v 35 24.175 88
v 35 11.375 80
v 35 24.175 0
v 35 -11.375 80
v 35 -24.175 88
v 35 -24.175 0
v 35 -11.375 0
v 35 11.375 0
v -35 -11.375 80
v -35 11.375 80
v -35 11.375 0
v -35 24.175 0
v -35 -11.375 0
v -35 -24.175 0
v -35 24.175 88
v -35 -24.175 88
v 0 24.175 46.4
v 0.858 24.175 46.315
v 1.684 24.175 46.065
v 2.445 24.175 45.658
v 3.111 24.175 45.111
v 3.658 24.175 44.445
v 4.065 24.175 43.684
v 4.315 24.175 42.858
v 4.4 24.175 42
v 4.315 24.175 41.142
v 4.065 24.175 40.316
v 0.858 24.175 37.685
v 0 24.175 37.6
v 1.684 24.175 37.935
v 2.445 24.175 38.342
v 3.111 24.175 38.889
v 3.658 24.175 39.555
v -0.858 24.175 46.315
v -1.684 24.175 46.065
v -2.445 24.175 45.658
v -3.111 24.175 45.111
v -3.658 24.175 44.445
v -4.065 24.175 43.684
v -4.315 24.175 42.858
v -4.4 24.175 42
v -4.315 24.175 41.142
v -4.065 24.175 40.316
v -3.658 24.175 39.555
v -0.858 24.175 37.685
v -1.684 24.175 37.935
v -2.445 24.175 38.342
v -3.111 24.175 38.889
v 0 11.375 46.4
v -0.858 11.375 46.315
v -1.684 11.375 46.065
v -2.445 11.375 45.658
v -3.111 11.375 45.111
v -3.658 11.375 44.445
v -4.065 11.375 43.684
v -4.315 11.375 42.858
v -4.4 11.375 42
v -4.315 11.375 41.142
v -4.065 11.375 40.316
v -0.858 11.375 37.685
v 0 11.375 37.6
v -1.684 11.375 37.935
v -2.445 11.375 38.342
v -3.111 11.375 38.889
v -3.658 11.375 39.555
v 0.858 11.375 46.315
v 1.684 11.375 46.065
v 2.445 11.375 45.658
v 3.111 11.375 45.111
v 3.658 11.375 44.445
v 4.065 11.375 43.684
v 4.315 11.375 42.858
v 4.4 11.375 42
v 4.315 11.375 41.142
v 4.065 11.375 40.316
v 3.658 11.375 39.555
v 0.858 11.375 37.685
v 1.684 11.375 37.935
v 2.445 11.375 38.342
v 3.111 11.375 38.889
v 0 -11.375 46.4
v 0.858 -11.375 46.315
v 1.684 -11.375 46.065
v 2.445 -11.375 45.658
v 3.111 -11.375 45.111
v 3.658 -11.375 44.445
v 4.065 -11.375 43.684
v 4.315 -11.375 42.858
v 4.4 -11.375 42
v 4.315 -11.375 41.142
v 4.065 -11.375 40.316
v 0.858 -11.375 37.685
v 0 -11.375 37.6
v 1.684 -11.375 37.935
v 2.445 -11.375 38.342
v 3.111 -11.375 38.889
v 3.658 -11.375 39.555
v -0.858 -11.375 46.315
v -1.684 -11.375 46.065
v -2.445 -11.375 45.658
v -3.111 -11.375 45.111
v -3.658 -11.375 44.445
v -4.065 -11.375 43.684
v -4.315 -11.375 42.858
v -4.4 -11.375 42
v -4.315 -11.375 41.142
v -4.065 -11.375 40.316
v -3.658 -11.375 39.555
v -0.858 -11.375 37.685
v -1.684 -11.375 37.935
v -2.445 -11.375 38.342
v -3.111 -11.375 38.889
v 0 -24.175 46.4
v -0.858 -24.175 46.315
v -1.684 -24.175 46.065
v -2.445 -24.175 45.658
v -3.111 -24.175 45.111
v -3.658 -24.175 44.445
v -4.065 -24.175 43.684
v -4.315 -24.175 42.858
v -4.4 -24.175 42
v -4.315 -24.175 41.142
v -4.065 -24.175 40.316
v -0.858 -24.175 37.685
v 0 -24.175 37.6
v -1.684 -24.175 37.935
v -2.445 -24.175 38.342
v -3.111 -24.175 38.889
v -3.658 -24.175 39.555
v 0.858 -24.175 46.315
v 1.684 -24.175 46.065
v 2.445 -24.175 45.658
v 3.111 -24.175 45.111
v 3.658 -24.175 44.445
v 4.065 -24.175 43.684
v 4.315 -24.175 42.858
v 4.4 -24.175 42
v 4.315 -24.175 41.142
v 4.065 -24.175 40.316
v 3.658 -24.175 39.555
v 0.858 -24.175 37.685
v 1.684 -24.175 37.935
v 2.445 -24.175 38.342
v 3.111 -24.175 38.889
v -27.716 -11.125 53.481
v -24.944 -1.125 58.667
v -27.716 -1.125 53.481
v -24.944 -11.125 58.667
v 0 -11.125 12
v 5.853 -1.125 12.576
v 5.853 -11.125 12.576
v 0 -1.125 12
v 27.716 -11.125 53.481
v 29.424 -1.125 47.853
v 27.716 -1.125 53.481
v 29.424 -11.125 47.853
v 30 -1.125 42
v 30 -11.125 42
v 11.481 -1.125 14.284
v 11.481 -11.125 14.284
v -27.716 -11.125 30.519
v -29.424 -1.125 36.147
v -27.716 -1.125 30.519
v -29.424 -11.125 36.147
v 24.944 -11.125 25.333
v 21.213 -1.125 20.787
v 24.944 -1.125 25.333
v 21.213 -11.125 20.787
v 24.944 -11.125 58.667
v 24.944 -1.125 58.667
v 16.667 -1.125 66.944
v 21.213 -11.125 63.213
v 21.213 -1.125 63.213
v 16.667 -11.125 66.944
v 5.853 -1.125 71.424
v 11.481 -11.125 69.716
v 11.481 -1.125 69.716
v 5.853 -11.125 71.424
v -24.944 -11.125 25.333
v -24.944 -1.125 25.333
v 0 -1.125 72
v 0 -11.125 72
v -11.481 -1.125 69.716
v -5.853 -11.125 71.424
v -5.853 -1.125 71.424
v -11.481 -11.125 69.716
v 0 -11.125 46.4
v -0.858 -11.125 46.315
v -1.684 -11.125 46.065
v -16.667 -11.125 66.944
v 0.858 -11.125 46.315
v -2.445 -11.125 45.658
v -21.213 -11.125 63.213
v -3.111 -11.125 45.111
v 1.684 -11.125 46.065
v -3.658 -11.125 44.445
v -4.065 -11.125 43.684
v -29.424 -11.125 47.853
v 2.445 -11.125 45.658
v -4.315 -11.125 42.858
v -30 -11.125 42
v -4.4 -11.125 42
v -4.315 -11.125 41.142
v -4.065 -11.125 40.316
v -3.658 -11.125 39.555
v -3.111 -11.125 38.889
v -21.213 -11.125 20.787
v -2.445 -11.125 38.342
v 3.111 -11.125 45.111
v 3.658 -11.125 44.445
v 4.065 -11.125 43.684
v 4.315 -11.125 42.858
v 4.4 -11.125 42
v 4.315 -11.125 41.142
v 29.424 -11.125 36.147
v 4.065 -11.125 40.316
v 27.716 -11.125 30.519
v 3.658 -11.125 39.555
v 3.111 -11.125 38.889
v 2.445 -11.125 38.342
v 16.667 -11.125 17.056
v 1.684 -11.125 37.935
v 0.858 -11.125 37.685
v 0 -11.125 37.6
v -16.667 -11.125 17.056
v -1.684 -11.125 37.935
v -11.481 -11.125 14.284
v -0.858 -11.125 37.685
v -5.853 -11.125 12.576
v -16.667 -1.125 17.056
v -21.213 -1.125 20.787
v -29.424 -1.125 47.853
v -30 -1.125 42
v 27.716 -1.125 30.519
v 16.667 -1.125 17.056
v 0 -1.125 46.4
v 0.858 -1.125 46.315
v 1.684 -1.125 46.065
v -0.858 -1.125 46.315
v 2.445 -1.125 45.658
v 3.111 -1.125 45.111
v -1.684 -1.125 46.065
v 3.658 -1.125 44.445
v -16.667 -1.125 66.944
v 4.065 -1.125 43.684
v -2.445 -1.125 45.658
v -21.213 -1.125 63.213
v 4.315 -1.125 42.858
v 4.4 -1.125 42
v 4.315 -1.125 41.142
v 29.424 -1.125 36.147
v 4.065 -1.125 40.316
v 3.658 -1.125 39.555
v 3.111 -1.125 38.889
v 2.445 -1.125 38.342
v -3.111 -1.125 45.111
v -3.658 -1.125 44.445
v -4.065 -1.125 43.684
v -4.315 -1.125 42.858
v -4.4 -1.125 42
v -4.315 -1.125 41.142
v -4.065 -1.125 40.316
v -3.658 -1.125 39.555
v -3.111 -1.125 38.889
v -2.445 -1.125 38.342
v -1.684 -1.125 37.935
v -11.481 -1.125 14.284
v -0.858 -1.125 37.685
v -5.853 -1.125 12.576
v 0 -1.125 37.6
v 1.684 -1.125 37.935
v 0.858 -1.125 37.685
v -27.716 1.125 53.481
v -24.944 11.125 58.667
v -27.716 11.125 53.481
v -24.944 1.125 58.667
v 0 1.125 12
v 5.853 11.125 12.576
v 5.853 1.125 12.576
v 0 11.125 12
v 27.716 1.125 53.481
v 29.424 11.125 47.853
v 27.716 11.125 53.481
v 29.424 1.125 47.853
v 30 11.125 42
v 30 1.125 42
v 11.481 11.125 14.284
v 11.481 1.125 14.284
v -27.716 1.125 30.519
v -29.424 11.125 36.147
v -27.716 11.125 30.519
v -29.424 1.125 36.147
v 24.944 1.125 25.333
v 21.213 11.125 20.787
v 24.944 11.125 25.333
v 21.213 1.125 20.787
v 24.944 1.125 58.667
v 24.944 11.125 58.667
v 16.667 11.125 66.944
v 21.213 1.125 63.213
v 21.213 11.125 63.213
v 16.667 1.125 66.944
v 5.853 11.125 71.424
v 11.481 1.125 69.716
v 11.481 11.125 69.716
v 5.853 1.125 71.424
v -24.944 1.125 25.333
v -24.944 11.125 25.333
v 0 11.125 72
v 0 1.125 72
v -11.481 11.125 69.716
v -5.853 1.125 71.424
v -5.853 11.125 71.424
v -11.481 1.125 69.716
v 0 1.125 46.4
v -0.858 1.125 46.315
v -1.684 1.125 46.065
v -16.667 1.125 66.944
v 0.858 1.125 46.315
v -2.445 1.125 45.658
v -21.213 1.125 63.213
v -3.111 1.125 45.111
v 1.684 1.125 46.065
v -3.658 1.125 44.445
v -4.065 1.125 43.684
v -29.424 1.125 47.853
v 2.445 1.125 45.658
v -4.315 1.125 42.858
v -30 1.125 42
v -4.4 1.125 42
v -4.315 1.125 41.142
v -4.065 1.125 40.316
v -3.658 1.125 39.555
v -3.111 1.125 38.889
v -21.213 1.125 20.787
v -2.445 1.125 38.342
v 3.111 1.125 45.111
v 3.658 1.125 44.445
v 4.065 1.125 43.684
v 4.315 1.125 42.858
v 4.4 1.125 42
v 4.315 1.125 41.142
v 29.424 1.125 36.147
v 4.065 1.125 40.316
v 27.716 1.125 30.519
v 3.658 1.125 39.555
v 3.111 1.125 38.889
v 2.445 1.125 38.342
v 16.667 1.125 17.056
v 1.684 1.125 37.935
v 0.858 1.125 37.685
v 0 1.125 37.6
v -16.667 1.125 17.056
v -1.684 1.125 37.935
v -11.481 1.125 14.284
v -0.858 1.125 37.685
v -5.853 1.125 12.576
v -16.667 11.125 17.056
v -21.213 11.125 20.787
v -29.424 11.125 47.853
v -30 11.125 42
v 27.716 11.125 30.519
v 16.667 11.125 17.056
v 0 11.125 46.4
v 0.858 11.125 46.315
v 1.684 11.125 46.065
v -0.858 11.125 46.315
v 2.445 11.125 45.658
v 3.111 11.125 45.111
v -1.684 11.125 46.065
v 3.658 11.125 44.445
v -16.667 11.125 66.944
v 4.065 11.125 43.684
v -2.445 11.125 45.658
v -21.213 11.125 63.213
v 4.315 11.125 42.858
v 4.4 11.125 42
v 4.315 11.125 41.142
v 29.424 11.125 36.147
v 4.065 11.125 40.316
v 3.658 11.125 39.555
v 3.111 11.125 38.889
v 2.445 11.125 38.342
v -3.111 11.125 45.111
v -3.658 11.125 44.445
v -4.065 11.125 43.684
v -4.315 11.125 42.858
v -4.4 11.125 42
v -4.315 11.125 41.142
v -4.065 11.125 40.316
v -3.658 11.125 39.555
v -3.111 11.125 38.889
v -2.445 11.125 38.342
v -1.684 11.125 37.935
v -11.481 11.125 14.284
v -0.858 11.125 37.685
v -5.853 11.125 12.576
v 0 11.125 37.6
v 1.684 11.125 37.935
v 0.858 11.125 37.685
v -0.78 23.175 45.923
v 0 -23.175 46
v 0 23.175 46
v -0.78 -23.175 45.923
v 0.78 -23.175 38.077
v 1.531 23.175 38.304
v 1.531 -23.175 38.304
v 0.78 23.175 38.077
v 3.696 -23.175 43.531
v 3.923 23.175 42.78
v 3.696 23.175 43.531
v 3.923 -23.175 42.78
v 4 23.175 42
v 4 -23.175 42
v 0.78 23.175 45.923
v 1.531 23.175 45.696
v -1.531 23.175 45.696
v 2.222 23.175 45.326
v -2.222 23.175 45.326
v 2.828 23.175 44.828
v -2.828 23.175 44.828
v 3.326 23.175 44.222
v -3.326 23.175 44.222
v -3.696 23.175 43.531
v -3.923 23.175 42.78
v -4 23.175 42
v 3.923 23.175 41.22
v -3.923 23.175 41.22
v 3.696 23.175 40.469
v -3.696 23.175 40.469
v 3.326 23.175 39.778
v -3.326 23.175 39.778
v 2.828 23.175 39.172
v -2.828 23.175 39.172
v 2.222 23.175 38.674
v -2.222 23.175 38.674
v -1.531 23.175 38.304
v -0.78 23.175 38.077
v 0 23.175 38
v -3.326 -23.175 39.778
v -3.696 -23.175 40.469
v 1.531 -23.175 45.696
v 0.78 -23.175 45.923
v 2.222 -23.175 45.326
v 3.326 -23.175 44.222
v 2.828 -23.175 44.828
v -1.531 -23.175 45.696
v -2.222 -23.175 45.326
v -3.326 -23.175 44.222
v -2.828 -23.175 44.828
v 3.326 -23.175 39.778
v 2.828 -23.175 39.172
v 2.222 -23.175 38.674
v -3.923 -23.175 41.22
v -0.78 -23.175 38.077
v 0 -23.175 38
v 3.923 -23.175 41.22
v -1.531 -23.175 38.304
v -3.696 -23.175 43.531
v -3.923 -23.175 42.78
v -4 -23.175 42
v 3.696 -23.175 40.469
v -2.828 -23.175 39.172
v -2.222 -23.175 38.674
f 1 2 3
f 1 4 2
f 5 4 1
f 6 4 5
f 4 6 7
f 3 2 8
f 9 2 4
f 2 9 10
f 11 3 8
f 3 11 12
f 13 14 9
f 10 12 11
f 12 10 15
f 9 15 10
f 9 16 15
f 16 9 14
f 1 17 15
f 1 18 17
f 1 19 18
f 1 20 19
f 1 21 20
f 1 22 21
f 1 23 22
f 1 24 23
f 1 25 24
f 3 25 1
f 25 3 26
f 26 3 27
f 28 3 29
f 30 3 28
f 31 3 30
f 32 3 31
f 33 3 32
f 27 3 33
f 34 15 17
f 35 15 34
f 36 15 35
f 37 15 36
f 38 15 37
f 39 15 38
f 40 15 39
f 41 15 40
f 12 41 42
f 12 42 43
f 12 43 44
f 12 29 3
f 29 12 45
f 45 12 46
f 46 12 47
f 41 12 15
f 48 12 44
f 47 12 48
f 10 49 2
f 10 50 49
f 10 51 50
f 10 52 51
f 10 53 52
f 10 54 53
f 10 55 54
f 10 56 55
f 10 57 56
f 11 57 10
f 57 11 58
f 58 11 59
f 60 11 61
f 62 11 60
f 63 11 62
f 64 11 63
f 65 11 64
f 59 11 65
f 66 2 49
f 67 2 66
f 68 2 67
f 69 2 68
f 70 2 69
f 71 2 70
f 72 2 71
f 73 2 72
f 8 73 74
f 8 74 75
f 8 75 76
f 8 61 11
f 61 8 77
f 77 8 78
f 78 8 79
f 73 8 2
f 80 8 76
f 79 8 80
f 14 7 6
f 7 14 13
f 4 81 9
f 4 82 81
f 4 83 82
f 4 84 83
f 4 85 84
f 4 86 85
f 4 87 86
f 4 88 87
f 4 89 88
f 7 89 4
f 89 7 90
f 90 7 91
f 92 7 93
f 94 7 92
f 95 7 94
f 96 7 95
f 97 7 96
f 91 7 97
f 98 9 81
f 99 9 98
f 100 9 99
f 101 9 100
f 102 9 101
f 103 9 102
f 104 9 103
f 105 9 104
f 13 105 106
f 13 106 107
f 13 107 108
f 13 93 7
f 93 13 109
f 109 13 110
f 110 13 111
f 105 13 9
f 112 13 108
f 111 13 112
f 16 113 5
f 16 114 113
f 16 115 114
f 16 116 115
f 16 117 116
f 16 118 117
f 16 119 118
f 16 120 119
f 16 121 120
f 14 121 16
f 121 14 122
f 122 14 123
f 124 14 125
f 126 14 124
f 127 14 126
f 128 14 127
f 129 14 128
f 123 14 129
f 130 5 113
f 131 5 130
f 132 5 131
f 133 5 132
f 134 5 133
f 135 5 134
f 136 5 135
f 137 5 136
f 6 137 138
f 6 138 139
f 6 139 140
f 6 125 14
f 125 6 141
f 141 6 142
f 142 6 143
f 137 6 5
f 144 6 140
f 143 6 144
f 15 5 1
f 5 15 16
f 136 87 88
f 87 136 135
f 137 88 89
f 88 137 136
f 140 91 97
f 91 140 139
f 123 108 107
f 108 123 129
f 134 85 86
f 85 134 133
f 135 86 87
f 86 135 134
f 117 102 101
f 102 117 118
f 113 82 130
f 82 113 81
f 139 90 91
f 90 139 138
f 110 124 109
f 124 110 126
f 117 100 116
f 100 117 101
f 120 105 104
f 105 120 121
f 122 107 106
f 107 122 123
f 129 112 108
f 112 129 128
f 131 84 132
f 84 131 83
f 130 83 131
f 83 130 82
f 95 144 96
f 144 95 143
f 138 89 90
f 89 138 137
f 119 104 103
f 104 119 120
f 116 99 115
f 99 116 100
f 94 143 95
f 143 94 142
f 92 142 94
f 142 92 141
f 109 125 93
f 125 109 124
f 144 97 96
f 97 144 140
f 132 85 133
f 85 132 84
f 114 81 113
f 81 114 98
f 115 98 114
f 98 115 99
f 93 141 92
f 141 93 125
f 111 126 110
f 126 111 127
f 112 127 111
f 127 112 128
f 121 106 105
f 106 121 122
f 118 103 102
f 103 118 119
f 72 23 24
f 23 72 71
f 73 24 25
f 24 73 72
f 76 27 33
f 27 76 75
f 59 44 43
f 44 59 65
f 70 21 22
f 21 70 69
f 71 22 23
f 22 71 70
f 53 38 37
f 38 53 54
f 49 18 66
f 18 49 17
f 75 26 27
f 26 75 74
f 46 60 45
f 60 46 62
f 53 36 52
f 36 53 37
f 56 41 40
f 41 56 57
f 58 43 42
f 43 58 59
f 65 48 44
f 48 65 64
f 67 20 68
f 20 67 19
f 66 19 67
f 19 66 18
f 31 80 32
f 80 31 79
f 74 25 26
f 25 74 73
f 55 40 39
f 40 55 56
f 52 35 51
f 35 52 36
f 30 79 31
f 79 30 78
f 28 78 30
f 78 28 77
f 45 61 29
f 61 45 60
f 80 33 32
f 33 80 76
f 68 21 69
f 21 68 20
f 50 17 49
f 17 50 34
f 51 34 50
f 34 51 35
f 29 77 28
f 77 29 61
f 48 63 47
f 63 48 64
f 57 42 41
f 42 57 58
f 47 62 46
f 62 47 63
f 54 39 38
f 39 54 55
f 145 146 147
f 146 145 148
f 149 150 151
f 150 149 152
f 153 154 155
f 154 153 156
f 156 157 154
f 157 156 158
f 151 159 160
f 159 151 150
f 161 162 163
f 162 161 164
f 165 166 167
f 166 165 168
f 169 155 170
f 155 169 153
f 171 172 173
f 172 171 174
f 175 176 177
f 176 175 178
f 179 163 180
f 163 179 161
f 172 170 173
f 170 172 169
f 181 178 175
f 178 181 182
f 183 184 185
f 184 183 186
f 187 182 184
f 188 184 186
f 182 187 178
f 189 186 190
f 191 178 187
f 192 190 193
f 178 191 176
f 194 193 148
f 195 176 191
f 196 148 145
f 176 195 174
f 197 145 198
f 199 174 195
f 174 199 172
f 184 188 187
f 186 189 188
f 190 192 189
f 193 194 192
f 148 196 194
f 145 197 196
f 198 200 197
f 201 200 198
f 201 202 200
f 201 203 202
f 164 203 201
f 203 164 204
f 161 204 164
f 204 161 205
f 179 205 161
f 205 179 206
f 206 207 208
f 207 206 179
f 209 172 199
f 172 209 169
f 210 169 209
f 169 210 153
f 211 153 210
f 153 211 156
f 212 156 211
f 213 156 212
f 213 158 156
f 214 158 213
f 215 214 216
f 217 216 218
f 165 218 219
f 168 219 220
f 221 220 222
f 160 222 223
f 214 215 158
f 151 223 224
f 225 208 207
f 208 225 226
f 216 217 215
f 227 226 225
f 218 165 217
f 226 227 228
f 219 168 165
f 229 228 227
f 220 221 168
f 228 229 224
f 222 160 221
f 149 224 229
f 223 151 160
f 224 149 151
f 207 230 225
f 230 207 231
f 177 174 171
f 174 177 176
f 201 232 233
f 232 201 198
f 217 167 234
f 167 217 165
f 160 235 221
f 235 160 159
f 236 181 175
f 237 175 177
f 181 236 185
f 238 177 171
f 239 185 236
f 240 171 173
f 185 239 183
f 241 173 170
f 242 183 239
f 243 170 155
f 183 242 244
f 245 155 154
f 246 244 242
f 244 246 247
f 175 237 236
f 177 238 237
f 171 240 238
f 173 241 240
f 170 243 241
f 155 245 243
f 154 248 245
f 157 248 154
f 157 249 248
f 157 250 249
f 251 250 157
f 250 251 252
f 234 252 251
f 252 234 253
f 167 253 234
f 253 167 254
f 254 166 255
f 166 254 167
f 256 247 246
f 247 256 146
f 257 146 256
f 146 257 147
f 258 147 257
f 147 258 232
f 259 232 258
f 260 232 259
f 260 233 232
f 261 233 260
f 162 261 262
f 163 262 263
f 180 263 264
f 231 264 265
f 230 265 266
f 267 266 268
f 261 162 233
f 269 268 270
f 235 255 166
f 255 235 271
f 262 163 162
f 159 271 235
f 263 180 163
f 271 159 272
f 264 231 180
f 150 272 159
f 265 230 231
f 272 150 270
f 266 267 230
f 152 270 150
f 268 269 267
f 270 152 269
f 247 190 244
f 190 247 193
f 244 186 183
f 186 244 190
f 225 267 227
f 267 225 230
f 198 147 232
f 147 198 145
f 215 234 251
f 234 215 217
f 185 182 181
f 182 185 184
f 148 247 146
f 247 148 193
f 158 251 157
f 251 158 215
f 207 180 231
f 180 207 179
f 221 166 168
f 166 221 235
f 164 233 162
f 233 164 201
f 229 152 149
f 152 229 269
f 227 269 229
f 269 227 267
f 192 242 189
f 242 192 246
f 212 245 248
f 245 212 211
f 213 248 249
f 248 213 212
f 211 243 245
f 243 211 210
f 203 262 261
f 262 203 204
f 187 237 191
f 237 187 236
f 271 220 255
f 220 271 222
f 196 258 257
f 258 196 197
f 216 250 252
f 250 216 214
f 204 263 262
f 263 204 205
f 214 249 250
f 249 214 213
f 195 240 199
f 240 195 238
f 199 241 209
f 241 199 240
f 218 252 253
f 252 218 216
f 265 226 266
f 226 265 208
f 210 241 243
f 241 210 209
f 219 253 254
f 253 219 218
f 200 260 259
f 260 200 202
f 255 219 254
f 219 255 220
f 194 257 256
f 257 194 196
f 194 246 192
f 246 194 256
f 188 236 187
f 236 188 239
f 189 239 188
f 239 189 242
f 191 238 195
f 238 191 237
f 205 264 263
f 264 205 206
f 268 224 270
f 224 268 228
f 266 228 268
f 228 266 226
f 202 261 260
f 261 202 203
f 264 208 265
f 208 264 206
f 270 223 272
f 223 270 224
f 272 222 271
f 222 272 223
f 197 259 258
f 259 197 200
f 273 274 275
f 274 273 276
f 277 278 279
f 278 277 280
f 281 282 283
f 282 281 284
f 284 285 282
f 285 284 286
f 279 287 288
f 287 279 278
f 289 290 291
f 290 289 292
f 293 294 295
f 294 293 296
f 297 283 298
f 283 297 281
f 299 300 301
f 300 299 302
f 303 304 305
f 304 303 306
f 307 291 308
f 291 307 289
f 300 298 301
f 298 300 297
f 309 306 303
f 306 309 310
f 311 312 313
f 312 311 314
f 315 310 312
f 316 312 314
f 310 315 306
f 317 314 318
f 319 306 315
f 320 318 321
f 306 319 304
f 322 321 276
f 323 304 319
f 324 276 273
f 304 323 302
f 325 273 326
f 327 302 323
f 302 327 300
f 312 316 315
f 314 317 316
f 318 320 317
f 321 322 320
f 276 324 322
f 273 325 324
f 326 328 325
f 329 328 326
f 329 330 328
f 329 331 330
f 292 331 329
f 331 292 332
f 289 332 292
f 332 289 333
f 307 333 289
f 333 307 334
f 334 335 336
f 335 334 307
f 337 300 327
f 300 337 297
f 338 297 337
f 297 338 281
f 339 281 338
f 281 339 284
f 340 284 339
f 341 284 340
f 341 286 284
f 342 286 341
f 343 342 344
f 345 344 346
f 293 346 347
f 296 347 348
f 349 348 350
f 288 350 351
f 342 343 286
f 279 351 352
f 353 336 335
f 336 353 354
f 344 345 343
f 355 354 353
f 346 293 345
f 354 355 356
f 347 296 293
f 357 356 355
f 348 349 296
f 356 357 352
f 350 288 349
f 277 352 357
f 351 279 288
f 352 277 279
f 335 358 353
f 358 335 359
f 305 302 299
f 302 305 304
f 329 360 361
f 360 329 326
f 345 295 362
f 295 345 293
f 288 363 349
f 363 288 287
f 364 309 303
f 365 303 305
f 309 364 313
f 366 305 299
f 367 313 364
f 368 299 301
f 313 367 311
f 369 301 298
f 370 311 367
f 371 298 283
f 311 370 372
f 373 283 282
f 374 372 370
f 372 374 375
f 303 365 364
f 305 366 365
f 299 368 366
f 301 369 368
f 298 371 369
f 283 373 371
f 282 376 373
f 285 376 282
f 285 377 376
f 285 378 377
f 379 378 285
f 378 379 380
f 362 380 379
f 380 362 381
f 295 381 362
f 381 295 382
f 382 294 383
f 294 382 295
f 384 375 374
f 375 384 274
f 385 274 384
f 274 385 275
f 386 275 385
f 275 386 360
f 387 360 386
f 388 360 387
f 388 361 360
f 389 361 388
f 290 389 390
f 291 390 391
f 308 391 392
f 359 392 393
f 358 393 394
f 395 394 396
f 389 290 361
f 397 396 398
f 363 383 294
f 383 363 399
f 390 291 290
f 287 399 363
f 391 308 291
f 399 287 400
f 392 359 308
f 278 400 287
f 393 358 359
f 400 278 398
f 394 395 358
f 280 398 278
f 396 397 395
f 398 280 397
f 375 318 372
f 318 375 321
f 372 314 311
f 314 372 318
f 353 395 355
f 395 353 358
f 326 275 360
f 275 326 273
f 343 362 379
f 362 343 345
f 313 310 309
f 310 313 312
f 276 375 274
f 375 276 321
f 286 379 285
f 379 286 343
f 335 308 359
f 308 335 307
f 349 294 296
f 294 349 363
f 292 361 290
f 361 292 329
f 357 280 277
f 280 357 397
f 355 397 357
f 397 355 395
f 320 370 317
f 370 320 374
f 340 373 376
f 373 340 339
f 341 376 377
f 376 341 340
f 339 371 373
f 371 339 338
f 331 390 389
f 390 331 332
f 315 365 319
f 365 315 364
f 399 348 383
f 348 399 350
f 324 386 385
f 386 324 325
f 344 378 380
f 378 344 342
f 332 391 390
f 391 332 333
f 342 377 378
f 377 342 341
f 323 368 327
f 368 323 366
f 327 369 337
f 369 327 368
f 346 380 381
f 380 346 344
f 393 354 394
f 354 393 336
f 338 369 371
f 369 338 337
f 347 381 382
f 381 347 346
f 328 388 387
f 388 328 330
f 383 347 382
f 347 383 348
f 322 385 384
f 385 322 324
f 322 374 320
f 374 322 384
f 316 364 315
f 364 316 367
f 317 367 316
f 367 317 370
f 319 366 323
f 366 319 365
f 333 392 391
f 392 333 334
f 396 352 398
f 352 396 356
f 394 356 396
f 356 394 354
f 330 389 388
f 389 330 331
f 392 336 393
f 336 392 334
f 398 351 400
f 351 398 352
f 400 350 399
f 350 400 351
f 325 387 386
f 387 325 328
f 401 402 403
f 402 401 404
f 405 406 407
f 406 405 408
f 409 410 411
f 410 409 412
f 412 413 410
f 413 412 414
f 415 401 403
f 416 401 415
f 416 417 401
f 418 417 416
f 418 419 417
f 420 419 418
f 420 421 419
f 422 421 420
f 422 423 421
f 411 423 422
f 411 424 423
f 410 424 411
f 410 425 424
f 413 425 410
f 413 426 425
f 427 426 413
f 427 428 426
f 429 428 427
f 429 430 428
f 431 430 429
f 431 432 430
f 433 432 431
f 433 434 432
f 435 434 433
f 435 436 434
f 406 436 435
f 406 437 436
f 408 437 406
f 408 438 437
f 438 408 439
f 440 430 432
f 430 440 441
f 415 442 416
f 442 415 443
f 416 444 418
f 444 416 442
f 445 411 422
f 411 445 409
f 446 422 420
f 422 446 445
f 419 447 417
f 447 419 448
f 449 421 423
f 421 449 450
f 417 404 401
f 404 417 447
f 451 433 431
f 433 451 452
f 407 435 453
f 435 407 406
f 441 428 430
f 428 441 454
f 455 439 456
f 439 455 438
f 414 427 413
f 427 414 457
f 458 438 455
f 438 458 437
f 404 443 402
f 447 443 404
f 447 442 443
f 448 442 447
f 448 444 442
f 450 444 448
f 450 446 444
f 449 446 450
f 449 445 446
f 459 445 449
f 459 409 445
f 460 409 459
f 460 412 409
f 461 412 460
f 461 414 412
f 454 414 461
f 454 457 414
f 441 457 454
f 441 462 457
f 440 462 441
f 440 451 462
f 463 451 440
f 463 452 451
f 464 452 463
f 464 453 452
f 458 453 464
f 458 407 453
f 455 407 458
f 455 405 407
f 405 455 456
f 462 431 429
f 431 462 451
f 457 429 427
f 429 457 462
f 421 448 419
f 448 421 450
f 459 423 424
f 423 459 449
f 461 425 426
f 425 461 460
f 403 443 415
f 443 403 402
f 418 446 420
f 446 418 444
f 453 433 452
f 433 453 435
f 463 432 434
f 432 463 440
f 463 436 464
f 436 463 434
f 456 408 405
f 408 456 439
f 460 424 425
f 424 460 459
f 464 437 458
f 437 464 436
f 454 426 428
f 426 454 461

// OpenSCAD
$fn = 32;

// ------------------------------------------------------------------------
// Trolley wheel set: wheels d60, fork 80 mm tall
// Every part is its own module, assembly() places every instance.
// ------------------------------------------------------------------------

// --- part 1 ---
module trolley_fork() {
  difference() {
    union() {
      translate([-35, 11.375, 0]) cube([70, 12.8, 80]);
      translate([-35, -24.175, 0]) cube([70, 12.8, 80]);
      translate([-35, -24.175, 80]) cube([70, 48.35, 8]);
    }
    translate([0, -17.775, 42]) rotate([90, 0, 0]) cylinder(h = 14.8, d = 8.8, center = true);
    translate([0, 17.775, 42]) rotate([90, 0, 0]) cylinder(h = 14.8, d = 8.8, center = true);
  }
}

// --- part 2 ---
module trolley_wheel() {
  difference() {
      translate([0, 0, 0]) cylinder(h = 10, d = 60);
      translate([0, 0, -1]) cylinder(h = 12, d = 8.8);
    }
}

// --- part 3 ---
module trolley_axle() {
  translate([0, 0, -23.175]) cylinder(h = 46.35, d = 8);
}

// --- assembly ---
module assembly() {
  color([0.80, 0.24, 0.20]) translate([0, 0, 0]) rotate([0, 0, 0]) trolley_fork();
  color([0.20, 0.45, 0.75]) translate([0, -1.125, 42]) rotate([90, 0, 0]) trolley_wheel();
  color([0.25, 0.62, 0.32]) translate([0, 11.125, 42]) rotate([90, 0, 0]) trolley_wheel();
  color([0.92, 0.70, 0.18]) translate([0, 0, 42]) rotate([90, 0, 0]) trolley_axle();
}

assembly();
